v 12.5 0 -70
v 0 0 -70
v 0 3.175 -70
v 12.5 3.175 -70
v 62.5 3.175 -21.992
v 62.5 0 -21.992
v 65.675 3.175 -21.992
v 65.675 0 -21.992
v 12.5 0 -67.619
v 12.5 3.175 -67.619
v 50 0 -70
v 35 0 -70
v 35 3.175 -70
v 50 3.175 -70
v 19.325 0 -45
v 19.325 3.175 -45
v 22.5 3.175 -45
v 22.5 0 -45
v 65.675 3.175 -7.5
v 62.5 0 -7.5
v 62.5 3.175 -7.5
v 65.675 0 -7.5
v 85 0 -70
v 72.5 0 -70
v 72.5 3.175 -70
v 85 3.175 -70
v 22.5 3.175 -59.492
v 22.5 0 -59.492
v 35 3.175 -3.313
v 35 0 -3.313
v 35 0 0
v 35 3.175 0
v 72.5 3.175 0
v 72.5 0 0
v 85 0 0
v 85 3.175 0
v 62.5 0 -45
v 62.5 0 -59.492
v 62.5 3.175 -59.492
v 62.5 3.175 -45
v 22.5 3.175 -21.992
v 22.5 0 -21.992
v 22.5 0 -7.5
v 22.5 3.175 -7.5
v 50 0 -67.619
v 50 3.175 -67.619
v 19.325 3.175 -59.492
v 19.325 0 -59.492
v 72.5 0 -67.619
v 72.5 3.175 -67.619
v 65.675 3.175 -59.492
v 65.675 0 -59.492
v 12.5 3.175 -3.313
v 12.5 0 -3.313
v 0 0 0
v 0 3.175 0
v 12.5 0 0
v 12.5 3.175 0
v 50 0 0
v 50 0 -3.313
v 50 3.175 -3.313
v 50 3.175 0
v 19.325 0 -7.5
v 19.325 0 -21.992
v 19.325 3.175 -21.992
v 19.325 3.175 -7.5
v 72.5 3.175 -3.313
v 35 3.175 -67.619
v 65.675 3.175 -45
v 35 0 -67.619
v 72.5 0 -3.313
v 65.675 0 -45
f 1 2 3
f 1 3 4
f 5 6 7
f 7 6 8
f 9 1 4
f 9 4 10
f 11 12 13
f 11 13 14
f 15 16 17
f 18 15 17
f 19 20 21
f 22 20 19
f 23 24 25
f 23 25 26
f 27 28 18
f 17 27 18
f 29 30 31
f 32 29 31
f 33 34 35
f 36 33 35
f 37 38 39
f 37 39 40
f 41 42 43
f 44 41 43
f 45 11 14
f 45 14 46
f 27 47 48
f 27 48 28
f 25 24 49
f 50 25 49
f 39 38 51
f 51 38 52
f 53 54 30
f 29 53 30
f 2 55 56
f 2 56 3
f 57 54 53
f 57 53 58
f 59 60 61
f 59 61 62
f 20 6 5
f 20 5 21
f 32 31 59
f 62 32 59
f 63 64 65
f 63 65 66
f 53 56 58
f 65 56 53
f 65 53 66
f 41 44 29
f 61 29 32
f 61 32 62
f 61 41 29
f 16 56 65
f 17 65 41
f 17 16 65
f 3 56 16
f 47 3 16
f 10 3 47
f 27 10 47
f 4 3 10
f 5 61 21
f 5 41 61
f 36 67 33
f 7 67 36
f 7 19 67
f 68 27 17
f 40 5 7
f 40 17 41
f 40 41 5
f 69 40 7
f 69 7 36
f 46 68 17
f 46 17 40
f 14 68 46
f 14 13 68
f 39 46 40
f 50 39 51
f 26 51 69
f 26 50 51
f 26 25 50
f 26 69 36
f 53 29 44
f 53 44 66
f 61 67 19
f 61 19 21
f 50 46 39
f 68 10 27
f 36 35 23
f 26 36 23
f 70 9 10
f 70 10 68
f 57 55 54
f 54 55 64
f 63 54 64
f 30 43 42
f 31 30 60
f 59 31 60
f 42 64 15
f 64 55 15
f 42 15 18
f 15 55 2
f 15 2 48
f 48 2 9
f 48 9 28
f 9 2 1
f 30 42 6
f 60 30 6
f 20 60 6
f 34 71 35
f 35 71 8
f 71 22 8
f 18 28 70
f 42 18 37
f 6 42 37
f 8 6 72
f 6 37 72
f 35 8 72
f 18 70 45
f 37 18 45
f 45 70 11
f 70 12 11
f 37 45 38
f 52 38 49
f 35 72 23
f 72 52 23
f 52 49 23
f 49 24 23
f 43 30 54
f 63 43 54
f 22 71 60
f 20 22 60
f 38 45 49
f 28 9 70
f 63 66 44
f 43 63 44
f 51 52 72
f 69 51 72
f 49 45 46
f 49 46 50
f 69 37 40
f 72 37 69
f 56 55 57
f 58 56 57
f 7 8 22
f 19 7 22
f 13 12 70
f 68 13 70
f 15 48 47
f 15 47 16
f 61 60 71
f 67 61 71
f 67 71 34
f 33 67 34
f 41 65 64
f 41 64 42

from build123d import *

# Parameters (mm, degrees)
SKETCH1_W           = 85
SKETCH1_H           = 70
BOSS_EXTRUDE1_DEPTH = 3.175
SKETCH2_W           = 3.175
SKETCH2_H           = 14.492
SKETCH2_W_2         = 22.5
SKETCH2_H_2         = 2.38125
SKETCH2_H_3         = 3.313043478
CUT_EXTRUDE1_DEPTH  = 4.175


with BuildPart() as part:
    # Sketch1 → Boss-Extrude1 (new body)
    with BuildSketch(Plane(origin=(0, 0, 0), x_dir=(1, 0, 0), z_dir=(0, 1, 0))):
        with Locations((42.5, 35)):
            Rectangle(SKETCH1_W, SKETCH1_H)
    extrude(amount=BOSS_EXTRUDE1_DEPTH)

    # Sketch2 → Cut-Extrude1 (cut, through all)
    with BuildSketch(Plane.XZ):
        with Locations((20.9125, -14.746)):
            Rectangle(SKETCH2_W, SKETCH2_H)
        with Locations((20.9125, -52.246)):
            Rectangle(SKETCH2_W, SKETCH2_H)
        with Locations((64.0875, -14.746)):
            Rectangle(SKETCH2_W, SKETCH2_H)
        with Locations((64.0875, -52.246)):
            Rectangle(SKETCH2_W, SKETCH2_H)
        with Locations((61.25, -68.809375)):
            Rectangle(SKETCH2_W_2, SKETCH2_H_2)
        with Locations((23.75, -68.809375)):
            Rectangle(SKETCH2_W_2, SKETCH2_H_2)
        with Locations((61.25, -1.656521739)):
            Rectangle(SKETCH2_W_2, SKETCH2_H_3)
        with Locations((23.75, -1.656521739)):
            Rectangle(SKETCH2_W_2, SKETCH2_H_3)
    extrude(amount=-CUT_EXTRUDE1_DEPTH, mode=Mode.SUBTRACT)


solid = part.part
